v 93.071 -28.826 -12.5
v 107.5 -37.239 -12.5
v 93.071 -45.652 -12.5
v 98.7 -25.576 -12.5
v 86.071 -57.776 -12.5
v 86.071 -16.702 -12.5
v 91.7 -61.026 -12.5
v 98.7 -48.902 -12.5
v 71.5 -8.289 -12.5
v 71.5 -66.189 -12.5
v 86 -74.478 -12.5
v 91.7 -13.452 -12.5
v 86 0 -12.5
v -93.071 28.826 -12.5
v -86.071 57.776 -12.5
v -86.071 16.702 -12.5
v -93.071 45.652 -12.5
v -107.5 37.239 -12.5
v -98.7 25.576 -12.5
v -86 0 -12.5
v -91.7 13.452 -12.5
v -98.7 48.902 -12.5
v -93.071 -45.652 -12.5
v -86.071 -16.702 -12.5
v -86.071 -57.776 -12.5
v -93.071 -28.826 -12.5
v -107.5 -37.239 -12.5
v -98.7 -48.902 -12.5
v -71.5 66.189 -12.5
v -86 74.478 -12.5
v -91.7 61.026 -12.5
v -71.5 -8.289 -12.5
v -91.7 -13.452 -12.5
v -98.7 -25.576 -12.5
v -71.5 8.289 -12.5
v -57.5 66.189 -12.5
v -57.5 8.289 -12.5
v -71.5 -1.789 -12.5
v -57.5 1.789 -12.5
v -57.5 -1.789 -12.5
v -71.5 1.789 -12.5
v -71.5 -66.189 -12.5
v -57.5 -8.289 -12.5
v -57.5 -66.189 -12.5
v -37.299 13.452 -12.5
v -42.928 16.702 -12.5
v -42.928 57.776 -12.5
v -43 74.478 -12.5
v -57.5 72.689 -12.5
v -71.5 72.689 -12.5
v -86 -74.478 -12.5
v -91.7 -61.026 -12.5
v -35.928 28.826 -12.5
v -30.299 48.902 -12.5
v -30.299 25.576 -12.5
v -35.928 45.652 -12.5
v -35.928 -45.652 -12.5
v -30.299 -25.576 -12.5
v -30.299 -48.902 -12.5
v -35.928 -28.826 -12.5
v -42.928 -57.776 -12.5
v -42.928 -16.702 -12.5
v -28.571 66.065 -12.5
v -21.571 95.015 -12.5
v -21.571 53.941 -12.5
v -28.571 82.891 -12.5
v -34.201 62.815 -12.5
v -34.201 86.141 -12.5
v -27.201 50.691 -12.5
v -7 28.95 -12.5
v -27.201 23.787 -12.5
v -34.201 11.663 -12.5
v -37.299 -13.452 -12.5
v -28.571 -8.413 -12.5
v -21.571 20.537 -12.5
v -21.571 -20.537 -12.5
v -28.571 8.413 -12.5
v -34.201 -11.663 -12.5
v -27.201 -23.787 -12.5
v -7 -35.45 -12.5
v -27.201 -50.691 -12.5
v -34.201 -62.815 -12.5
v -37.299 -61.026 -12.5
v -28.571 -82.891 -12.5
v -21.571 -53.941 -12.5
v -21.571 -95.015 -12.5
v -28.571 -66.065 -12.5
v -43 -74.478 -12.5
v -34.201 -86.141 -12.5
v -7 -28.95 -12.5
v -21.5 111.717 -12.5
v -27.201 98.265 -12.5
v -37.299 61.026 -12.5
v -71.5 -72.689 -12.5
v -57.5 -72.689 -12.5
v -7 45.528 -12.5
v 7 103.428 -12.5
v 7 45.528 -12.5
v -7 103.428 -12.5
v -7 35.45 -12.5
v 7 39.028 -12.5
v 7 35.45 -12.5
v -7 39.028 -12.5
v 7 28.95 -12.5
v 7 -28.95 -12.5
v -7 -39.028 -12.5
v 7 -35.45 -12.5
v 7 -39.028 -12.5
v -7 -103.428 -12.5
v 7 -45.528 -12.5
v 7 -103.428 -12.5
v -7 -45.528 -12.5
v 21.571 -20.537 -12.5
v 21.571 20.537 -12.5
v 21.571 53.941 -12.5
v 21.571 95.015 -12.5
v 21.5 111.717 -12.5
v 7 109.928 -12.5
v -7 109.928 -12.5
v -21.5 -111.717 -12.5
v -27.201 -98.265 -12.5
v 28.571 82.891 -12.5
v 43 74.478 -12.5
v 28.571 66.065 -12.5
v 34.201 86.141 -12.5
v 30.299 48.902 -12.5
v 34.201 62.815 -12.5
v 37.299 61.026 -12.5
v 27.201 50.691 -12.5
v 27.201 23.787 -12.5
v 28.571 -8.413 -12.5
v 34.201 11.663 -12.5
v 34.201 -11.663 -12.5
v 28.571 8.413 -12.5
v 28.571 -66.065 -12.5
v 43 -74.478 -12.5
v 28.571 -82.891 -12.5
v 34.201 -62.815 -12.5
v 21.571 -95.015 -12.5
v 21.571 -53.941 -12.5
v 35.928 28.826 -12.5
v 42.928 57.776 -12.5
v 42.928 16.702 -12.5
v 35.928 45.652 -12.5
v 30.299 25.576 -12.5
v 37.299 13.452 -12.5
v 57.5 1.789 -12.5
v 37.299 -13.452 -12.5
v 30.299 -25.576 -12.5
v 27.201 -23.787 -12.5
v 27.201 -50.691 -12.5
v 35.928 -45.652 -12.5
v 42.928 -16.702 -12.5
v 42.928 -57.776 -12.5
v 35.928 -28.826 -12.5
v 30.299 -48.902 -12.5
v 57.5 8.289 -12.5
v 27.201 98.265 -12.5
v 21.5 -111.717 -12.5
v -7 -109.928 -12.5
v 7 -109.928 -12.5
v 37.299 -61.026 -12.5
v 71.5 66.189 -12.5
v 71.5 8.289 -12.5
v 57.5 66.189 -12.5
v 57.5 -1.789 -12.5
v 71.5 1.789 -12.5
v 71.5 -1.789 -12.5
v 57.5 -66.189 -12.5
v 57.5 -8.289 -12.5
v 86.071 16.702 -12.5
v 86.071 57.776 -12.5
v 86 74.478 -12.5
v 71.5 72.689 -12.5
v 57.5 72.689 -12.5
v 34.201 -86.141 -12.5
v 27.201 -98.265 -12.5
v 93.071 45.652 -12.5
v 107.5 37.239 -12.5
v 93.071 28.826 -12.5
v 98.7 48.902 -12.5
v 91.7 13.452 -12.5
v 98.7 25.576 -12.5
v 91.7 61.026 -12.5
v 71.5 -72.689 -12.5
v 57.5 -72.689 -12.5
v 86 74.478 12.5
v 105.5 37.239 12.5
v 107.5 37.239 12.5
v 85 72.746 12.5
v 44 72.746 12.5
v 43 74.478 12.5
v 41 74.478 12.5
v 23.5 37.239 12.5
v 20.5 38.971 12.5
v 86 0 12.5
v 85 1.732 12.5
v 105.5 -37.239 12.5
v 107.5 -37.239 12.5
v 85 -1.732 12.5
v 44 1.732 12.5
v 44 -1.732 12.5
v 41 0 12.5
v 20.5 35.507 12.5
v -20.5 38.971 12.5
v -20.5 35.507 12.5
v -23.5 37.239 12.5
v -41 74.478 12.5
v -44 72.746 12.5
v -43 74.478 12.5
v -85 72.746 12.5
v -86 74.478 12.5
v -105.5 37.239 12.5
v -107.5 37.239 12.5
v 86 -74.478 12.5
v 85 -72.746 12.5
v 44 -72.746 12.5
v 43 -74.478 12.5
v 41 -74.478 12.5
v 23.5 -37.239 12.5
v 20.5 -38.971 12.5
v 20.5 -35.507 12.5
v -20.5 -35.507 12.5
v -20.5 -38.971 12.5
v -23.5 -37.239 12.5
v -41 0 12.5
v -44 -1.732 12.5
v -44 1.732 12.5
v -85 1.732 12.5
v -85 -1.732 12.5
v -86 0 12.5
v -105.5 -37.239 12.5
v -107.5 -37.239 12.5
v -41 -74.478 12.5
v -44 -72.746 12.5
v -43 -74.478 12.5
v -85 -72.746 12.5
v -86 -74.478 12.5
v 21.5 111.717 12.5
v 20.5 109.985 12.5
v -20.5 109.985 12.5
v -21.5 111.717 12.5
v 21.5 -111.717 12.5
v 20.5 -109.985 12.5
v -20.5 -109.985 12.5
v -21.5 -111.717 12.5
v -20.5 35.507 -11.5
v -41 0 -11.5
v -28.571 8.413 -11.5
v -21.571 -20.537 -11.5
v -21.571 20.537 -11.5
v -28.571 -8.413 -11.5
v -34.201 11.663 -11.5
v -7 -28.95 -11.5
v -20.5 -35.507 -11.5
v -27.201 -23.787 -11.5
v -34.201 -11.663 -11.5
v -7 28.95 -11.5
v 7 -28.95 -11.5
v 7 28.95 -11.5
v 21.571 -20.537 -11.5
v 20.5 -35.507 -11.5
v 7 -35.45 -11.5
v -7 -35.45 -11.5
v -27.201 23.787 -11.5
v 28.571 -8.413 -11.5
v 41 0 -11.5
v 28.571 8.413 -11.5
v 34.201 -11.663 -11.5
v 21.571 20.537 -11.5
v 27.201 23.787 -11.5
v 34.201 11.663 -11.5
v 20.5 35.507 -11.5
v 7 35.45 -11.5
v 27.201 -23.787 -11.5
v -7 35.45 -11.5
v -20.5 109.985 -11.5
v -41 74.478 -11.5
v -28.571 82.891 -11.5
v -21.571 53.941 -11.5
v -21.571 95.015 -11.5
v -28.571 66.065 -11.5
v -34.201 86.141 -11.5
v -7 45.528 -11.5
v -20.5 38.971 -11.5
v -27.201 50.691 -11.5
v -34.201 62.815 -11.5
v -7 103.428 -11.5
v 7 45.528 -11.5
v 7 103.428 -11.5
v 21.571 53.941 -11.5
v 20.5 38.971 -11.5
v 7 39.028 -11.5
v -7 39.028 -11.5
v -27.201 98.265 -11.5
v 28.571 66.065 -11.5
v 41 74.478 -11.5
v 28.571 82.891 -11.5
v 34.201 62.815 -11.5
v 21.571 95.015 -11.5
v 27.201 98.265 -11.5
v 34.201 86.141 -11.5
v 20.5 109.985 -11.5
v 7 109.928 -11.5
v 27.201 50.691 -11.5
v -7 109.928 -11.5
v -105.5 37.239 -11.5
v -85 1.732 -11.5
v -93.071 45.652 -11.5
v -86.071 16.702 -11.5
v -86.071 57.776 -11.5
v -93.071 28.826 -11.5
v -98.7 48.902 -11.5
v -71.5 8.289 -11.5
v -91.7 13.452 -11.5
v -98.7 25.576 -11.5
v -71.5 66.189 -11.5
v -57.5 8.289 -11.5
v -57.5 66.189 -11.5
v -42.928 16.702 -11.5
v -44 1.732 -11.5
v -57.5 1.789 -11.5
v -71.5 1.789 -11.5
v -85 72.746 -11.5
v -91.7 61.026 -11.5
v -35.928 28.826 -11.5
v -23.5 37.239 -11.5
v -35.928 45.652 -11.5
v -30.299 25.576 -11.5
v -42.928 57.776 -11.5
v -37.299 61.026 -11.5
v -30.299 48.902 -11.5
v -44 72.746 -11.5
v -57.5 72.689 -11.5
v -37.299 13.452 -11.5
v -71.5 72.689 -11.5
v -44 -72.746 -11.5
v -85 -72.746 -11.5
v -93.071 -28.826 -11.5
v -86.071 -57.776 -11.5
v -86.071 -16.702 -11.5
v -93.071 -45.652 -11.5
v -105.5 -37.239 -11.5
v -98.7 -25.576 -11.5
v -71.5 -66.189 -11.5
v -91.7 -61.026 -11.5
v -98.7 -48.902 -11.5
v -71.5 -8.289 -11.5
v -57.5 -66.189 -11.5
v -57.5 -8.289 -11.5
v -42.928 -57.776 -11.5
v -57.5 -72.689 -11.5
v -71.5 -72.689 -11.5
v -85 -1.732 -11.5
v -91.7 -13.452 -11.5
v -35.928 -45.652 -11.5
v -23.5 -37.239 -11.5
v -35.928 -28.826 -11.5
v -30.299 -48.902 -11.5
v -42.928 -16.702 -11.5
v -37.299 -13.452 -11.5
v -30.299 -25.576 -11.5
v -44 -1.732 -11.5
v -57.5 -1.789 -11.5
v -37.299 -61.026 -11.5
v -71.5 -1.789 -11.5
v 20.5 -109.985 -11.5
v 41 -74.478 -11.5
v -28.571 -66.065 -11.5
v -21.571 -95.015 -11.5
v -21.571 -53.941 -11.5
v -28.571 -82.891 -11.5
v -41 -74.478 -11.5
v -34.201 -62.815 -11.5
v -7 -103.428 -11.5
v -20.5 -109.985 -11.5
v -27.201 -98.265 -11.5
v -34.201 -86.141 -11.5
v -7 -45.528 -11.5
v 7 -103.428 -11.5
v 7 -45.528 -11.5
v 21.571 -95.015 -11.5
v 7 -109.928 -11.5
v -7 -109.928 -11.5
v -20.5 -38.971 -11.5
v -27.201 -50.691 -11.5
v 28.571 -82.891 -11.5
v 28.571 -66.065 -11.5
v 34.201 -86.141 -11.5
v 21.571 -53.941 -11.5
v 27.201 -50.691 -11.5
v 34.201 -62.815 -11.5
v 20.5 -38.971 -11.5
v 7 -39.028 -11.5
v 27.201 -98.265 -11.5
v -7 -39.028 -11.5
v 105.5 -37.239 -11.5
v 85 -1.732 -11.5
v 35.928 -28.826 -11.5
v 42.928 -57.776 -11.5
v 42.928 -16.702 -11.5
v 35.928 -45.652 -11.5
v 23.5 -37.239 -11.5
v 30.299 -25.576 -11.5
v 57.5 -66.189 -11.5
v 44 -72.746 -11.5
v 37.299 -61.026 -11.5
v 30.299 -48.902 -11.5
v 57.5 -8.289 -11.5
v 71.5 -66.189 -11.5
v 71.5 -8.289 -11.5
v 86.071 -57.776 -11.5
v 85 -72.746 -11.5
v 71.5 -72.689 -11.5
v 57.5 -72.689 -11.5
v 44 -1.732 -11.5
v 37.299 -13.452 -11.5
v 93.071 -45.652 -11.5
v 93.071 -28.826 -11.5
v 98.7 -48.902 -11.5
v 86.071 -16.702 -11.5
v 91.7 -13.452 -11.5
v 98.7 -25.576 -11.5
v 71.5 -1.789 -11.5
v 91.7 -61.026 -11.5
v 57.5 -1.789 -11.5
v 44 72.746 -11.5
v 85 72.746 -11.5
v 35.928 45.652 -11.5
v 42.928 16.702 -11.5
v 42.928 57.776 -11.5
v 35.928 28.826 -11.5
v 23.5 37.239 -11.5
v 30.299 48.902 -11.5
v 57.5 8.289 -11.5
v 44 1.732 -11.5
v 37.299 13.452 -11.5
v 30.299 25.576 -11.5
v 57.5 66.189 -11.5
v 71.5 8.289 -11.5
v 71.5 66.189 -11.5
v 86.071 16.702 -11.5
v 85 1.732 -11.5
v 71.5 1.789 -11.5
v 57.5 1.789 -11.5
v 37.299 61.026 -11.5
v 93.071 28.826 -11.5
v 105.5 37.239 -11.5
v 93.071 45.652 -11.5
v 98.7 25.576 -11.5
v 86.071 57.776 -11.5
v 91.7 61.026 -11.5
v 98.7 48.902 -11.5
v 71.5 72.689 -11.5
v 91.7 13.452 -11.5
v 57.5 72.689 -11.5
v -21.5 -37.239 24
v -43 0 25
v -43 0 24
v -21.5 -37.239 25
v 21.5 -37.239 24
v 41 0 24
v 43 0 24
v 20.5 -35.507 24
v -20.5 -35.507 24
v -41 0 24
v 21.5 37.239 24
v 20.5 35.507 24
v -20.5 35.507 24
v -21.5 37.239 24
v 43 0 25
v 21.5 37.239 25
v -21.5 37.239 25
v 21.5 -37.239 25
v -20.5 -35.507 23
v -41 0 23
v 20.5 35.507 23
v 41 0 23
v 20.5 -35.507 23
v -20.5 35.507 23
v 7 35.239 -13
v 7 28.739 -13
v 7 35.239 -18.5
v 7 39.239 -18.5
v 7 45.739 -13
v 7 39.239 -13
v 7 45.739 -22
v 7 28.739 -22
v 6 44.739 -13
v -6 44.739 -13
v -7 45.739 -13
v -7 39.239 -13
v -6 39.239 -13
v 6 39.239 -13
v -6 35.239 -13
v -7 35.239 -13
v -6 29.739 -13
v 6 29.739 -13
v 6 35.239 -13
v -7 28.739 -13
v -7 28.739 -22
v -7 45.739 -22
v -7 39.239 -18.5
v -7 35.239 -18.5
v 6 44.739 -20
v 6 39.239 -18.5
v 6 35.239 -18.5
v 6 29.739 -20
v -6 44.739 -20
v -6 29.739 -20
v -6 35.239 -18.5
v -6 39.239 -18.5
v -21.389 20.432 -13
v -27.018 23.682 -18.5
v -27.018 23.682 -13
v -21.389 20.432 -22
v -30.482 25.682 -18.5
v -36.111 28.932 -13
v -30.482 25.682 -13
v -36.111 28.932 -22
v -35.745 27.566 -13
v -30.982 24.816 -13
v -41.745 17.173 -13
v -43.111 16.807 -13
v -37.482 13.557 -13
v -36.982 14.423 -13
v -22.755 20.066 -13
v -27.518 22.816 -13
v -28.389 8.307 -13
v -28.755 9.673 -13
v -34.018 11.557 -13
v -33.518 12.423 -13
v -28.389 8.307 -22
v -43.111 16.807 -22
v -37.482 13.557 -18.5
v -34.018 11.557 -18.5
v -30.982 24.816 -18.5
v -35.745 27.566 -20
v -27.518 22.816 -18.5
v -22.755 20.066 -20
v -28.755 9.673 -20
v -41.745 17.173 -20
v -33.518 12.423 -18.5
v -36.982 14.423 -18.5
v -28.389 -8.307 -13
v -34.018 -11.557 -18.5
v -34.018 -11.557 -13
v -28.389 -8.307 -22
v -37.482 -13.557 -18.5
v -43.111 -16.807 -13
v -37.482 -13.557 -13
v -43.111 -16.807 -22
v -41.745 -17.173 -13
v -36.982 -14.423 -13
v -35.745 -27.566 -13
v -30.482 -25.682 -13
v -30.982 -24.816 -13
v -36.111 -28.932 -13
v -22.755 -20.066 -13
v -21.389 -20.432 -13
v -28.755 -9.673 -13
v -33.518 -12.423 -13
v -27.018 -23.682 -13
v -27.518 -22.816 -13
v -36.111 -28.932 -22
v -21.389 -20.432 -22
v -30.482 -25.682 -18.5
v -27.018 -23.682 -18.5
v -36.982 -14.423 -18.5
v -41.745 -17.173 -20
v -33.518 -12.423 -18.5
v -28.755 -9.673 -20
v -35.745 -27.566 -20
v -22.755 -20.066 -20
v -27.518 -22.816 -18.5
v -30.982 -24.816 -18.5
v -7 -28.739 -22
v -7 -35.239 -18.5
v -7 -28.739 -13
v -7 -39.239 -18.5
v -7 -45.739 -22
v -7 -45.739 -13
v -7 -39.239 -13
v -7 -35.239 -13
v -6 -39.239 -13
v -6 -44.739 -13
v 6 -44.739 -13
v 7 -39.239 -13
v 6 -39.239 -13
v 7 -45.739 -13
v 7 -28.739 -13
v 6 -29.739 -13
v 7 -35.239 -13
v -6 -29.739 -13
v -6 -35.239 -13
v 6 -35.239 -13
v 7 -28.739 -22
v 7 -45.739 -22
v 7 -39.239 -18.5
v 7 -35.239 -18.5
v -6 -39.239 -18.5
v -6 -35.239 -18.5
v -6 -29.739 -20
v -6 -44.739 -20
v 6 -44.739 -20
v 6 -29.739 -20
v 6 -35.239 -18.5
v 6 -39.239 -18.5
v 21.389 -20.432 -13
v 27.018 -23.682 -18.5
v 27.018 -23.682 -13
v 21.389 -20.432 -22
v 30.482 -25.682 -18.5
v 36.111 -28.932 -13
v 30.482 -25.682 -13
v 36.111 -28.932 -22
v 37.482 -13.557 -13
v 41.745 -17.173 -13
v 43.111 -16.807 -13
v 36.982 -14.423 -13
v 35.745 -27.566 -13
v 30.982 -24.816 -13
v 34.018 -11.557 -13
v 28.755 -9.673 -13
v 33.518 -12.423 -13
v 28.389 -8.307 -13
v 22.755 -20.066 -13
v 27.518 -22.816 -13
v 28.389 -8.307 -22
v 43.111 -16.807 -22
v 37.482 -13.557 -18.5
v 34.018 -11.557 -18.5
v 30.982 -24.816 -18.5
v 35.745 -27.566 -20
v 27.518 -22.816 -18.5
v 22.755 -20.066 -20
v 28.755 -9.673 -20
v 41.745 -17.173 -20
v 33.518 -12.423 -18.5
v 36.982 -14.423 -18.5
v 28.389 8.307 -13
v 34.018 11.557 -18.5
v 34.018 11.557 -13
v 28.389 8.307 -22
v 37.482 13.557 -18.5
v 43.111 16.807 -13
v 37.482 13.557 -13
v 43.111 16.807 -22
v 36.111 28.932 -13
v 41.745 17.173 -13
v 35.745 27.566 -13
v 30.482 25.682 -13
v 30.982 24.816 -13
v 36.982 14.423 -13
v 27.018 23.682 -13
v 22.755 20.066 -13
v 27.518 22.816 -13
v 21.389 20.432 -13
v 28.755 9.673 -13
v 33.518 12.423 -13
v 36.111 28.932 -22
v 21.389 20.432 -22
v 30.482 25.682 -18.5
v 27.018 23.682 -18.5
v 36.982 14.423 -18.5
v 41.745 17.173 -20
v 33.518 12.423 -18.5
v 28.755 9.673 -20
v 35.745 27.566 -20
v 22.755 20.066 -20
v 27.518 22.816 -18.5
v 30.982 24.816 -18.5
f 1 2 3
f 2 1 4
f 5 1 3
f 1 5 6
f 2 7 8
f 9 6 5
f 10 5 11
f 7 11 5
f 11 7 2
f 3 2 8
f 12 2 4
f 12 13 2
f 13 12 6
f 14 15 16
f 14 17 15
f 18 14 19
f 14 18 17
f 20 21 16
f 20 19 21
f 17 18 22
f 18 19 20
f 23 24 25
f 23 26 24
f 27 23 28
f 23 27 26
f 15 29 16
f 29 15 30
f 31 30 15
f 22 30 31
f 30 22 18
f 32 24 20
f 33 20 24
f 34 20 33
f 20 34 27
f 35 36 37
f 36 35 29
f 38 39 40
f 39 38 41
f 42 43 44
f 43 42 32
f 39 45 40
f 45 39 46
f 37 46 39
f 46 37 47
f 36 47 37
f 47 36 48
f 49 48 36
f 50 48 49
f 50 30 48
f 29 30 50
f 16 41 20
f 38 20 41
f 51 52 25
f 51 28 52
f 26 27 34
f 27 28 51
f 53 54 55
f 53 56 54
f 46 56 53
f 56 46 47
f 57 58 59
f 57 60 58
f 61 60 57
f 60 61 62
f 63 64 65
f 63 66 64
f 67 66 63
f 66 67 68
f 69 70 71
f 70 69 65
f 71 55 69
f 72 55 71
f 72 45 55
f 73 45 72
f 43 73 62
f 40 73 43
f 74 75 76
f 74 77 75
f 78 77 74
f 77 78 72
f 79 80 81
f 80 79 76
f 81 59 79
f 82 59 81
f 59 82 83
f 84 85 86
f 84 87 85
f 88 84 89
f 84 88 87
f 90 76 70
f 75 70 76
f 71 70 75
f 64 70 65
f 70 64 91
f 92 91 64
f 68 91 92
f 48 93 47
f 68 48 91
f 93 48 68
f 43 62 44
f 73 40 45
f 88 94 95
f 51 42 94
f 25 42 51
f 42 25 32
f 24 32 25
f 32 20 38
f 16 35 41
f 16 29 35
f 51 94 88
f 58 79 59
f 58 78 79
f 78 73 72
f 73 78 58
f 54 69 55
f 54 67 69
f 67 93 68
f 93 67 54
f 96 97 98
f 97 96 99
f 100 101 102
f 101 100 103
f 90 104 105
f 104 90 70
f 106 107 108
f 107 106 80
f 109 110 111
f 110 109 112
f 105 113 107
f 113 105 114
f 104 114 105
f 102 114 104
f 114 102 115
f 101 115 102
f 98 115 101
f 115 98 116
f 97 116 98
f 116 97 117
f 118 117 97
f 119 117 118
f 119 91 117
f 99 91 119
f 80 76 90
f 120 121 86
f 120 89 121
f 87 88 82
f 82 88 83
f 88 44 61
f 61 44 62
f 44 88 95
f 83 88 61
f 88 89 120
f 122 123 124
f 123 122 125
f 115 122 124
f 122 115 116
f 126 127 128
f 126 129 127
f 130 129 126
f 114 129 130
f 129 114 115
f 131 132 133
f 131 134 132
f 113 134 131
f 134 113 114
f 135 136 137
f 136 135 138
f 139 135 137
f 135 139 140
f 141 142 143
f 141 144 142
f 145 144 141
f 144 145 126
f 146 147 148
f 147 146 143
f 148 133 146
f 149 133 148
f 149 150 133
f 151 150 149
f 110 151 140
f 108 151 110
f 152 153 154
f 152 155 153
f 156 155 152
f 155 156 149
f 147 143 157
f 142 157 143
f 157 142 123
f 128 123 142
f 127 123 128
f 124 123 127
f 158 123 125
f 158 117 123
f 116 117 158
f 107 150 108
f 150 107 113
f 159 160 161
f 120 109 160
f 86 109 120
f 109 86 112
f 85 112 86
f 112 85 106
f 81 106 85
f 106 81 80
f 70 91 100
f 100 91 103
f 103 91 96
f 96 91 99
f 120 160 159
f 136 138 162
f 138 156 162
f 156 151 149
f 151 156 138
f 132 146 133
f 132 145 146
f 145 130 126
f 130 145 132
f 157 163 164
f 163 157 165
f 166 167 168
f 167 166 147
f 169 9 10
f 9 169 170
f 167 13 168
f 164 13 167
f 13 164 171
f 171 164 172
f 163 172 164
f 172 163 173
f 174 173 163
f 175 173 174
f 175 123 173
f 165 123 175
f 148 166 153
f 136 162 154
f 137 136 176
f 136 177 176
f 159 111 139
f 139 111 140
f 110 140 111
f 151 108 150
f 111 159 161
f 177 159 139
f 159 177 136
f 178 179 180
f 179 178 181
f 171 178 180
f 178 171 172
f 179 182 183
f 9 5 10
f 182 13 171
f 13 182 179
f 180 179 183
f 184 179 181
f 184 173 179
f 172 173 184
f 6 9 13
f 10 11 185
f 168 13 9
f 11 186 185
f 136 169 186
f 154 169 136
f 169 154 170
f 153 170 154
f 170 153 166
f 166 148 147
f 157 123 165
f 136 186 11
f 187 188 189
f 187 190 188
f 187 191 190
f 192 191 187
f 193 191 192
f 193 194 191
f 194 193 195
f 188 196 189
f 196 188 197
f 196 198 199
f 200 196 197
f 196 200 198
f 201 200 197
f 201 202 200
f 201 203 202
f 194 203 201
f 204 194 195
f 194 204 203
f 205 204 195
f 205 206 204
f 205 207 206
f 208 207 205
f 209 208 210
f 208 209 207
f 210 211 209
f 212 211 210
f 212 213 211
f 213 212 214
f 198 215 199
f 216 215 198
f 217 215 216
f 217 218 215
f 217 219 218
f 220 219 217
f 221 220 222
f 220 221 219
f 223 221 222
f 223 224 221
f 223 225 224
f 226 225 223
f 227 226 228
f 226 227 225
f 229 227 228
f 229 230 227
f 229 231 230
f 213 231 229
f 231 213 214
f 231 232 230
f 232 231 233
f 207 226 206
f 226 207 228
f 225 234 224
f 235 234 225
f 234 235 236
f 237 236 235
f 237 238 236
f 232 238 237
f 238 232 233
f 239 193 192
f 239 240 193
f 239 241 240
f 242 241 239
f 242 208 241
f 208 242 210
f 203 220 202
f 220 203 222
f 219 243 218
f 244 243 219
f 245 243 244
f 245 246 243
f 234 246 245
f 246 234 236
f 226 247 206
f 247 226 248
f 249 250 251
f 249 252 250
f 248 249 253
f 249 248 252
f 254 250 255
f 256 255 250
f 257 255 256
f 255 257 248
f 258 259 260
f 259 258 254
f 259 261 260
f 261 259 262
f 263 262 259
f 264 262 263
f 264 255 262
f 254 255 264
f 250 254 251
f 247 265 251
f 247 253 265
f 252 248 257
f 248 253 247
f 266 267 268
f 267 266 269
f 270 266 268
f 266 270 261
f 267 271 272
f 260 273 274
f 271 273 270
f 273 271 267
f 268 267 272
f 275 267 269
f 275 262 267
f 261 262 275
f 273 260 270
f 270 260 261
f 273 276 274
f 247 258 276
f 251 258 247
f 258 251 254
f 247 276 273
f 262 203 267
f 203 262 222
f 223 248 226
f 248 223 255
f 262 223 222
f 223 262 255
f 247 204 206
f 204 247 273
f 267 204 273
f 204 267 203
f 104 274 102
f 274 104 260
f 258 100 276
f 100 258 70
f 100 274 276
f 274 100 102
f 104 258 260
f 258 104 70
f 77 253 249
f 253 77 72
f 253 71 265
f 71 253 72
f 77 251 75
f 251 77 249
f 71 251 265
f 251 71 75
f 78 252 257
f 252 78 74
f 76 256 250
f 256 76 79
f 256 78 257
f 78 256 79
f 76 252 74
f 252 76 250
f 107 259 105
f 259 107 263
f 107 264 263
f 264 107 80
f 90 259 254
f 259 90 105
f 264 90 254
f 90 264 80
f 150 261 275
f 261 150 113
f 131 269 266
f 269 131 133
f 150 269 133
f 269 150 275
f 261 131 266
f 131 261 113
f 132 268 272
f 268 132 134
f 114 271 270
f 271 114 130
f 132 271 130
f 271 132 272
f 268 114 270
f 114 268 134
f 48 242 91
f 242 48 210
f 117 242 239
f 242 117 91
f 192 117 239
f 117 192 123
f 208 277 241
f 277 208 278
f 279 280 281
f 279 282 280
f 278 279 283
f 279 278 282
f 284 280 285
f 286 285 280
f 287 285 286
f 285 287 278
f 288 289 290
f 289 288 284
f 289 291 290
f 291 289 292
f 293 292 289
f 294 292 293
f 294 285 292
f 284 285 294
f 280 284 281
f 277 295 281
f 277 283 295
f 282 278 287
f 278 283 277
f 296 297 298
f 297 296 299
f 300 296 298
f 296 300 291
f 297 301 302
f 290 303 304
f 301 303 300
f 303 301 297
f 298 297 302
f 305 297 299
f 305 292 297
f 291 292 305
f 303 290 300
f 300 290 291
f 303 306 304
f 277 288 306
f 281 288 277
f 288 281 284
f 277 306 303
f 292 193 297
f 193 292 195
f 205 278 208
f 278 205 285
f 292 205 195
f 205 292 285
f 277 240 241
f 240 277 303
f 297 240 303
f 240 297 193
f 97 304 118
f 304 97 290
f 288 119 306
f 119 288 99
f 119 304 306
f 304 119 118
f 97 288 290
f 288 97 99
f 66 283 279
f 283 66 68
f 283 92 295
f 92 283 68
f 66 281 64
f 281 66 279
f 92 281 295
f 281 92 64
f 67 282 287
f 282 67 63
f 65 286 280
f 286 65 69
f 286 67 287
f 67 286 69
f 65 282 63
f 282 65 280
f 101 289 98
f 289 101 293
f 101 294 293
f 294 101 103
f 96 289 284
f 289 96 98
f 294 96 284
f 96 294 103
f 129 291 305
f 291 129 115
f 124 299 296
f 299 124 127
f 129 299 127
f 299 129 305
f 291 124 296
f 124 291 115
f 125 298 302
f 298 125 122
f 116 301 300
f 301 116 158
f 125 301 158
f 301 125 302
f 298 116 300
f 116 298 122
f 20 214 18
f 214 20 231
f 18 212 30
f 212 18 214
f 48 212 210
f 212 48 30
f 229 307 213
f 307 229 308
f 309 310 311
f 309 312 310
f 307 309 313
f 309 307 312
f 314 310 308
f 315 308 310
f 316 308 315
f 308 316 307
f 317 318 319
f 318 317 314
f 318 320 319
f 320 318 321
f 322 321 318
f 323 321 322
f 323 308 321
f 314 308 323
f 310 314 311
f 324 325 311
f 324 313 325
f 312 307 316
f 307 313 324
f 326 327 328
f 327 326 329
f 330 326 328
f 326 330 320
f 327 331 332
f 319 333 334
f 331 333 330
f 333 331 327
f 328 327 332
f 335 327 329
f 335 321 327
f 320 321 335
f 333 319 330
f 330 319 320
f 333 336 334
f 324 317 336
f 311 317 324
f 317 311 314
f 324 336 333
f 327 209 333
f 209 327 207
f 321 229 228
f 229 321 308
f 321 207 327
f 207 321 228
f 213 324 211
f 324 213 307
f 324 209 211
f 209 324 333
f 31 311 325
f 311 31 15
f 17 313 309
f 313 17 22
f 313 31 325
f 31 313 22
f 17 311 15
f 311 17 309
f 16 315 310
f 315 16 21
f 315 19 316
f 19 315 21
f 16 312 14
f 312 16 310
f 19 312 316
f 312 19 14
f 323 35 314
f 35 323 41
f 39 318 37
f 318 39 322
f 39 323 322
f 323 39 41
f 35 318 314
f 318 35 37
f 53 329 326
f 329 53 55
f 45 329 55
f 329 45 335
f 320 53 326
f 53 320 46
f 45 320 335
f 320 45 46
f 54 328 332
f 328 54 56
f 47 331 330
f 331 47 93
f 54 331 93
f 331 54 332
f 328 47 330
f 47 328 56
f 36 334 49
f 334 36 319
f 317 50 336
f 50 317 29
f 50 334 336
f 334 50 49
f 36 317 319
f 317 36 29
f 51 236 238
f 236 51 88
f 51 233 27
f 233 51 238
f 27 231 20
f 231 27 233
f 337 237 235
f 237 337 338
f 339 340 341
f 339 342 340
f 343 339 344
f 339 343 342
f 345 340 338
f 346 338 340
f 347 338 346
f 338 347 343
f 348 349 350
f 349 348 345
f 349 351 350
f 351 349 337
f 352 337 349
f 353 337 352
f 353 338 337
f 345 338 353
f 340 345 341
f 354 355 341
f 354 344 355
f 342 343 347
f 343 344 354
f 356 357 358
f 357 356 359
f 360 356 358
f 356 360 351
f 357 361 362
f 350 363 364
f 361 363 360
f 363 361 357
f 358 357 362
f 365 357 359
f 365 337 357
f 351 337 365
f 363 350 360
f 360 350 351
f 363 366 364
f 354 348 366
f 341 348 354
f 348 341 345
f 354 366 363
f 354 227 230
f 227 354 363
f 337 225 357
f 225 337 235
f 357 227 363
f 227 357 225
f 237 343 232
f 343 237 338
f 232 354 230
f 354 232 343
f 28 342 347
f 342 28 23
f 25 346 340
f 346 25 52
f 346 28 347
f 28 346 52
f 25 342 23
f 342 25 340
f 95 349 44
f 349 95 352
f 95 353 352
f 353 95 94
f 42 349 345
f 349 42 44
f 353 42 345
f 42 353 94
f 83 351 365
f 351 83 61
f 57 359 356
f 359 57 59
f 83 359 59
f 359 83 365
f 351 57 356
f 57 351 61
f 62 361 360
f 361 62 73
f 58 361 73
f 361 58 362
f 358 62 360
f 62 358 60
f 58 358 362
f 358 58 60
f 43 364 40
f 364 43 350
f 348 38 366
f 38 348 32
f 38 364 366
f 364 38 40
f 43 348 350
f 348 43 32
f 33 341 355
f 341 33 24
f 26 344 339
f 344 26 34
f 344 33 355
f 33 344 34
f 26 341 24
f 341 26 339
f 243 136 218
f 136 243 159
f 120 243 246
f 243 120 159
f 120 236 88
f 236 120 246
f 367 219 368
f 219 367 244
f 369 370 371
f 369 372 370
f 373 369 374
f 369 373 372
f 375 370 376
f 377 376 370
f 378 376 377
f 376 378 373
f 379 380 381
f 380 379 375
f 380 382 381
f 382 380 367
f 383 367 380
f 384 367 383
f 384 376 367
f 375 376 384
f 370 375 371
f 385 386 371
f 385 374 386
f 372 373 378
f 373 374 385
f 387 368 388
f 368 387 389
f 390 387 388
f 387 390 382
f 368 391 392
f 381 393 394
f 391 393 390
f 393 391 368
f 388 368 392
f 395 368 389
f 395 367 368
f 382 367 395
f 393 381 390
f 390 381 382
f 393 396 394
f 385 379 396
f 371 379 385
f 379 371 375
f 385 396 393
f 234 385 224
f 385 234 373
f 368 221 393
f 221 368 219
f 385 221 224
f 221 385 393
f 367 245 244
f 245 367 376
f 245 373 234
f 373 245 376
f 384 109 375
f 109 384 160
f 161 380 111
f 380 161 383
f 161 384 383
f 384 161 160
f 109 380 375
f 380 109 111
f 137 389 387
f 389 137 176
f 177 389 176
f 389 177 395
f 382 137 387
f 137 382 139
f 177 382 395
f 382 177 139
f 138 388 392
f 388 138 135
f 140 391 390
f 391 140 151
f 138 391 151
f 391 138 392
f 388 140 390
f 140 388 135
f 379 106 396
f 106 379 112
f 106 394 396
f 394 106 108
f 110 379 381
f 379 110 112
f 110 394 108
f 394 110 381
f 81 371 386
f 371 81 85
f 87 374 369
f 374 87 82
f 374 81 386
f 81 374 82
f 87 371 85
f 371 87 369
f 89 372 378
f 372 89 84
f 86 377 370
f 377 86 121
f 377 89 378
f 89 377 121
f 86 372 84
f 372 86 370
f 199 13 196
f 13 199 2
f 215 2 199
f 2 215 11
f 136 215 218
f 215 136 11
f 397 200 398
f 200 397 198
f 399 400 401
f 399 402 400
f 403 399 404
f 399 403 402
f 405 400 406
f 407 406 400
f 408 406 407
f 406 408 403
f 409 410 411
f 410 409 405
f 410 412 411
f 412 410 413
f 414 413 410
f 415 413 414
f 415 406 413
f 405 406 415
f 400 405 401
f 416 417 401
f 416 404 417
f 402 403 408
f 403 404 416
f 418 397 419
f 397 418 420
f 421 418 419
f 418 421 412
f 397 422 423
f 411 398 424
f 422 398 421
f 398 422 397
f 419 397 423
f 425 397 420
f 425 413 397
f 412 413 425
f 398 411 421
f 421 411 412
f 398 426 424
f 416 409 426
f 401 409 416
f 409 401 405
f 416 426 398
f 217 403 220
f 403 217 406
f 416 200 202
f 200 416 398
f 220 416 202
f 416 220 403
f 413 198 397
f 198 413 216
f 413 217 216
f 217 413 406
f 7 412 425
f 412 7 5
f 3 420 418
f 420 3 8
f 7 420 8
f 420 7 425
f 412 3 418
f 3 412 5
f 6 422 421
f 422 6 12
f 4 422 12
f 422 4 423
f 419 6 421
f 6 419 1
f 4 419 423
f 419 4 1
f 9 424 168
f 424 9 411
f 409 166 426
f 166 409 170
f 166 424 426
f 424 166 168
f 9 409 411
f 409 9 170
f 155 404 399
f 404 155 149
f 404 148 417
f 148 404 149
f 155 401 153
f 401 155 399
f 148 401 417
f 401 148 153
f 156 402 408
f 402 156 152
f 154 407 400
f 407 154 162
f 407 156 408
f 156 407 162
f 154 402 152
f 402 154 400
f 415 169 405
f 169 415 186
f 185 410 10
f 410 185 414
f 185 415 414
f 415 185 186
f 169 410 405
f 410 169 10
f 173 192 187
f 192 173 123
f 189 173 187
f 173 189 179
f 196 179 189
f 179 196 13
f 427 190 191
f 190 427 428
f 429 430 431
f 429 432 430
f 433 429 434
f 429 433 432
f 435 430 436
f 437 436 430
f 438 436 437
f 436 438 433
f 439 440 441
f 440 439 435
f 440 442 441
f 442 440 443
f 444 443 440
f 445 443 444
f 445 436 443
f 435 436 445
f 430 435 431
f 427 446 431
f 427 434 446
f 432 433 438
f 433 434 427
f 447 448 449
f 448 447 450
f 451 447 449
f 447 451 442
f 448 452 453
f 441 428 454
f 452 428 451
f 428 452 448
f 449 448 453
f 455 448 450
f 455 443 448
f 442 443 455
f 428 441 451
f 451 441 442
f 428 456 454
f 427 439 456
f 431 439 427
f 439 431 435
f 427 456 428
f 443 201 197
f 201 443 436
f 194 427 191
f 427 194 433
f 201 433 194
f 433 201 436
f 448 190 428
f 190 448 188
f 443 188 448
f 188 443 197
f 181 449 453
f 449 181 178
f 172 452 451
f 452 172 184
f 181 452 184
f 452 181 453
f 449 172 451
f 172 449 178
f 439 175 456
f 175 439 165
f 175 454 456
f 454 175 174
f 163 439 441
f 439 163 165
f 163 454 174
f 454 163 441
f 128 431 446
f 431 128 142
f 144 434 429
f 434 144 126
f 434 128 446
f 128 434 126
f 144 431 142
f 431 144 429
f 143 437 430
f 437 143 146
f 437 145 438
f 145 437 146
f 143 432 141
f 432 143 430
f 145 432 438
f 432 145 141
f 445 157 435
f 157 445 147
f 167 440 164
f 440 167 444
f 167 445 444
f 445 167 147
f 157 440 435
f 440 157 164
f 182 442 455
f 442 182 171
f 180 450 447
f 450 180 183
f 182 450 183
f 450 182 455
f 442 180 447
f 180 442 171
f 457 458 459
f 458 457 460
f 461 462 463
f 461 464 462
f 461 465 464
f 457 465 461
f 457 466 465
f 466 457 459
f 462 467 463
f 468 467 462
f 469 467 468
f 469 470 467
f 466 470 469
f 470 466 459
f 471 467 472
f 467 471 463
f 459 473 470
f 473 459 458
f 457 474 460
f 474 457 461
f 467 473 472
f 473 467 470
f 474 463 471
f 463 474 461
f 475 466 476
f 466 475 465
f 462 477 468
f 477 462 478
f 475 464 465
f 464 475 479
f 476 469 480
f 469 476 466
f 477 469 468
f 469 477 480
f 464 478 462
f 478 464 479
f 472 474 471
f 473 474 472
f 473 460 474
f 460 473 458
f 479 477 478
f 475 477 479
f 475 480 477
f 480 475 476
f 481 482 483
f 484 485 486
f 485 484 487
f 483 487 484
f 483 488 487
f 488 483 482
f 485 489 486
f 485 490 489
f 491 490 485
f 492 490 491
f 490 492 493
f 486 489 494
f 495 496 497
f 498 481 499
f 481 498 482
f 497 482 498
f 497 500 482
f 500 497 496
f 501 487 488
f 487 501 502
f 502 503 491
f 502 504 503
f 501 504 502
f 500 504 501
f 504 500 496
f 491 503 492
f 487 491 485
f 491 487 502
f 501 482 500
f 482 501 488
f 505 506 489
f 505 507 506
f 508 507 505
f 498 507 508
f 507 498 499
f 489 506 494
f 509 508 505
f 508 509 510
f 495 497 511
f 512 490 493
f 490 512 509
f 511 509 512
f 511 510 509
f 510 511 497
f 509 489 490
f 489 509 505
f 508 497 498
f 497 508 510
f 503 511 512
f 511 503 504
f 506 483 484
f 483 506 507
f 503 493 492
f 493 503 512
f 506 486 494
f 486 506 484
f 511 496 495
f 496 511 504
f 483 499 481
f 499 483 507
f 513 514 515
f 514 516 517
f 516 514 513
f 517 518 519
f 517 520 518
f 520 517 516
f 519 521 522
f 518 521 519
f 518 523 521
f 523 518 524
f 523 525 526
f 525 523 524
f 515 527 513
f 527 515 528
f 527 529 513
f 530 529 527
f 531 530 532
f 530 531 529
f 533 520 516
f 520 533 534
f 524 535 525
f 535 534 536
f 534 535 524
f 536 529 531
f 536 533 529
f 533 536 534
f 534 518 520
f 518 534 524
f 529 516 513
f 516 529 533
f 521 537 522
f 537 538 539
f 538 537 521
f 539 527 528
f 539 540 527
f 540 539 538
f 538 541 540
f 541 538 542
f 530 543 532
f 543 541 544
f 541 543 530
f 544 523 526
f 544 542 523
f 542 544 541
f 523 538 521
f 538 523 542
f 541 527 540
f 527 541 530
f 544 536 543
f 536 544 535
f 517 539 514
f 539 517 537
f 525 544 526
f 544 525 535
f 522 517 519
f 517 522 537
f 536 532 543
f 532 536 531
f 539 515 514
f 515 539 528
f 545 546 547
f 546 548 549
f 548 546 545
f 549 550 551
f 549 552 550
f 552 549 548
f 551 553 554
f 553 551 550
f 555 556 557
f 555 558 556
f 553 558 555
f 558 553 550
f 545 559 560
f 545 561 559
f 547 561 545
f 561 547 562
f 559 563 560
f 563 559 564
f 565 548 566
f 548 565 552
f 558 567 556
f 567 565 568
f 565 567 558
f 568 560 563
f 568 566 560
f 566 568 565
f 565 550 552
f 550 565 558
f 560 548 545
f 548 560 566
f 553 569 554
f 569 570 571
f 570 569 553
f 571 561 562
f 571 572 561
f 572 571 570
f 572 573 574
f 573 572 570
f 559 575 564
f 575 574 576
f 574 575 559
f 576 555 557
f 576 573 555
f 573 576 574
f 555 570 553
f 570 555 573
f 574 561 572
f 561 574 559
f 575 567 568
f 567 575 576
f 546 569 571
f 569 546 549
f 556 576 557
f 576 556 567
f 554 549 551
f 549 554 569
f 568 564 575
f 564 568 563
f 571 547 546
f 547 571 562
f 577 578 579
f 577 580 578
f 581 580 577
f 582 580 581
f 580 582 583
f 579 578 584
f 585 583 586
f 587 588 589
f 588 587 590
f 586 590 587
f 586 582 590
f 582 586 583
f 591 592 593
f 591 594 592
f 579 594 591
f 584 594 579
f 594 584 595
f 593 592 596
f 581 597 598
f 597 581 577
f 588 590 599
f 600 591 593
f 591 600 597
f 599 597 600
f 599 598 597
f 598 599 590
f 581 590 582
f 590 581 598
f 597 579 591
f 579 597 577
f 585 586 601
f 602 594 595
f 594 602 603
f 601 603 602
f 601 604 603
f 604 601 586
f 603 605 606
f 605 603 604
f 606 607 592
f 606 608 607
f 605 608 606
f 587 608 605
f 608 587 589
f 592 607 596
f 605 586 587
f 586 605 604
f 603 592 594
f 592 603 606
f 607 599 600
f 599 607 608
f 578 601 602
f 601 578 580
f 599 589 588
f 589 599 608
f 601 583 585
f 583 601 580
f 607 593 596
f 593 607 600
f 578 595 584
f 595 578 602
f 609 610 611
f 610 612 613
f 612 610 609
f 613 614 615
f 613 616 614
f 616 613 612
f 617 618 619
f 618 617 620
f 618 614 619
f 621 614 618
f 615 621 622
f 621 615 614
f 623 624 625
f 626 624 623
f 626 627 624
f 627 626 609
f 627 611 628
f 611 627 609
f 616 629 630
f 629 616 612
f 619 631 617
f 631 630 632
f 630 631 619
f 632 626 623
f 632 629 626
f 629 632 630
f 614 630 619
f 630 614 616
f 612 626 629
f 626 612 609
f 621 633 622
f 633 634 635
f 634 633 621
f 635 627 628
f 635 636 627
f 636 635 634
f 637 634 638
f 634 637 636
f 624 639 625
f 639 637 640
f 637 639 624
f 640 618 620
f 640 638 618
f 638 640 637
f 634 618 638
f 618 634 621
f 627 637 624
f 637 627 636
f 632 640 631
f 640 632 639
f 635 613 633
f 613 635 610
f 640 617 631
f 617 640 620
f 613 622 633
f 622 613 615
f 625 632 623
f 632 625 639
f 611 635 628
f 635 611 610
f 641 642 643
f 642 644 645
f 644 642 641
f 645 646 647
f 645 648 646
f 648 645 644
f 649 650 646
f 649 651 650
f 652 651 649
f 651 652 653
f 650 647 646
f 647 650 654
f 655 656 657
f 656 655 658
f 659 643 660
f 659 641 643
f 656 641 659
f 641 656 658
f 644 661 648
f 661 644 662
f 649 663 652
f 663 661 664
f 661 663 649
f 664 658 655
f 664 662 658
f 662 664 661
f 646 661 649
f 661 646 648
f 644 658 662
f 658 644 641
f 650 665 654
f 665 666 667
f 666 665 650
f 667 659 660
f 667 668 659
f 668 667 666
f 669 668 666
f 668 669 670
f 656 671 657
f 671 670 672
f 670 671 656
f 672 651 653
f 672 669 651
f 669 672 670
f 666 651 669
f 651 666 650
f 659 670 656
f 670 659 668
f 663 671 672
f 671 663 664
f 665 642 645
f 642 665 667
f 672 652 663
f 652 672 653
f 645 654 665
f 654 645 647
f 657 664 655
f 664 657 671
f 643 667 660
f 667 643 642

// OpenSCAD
/* 
Cololight like hexagon lights
*/

// include <cololight_tribute_header.scad>

/* 
variable definitions
*/

hex_height=25;
hex_lon_d=86;
hex_short_d=74.478;
hex_incir_rad=43;
hex_lip_depth=1;
diffuser_thickness=2;
diffuser_lip_width=0;
diffuser_edge_thickness=1;
diffuser_clip_thickness=4;
diffuser_clip_wall_thickness=1;
base_thickness=1;
edge_thickness=2;
pin_header_width=8;
pin_header_height=2.5;
clip_mouth_width=14;
clip_mouth_length=6.5;
clip_edge_offset=4.3;
clip_height_constant=8;
//clip_width=22;
clip_length=(2*clip_mouth_length)+(2*edge_thickness);
clip_height=clip_height_constant+base_thickness;


 /*
hexagonal light housing
*/

module hex_light_module(module_height=hex_height, module_radius=hex_incir_rad, module_color="yellow", module_edge_thickness=edge_thickness, module_base_thickness=base_thickness, module_diffuser_thickness=diffuser_thickness, module_diffuser_lip_width=diffuser_lip_width, module_clip_mouth_width=clip_mouth_width, module_clip_mouth_length=clip_mouth_length, module_clip_edge_offset=clip_edge_offset, module_short_d=hex_short_d) {
    
    color(module_color)
   
    difference() {
        
        difference() {
        
            difference() {
                linear_extrude(height = module_height, center = true, convexity = 10, twist = 0){
                circle(r=module_radius, $fn=6);
                }
                translate([0,0,module_base_thickness]){
                    linear_extrude(height = module_height, center = true, convexity = 10, twist = 0){
                        circle(r=module_radius-module_edge_thickness, $fn=6);
                    }
                }
            }
            
            translate([0,0,(module_height/2)]){
                linear_extrude(height = module_diffuser_thickness-(module_edge_thickness-module_diffuser_lip_width), center = true, convexity = 10, twist = 0){
                    circle(r=module_radius-1, $fn=6);
                }
            }
        }
         
       
        for(a=[0:1:5]){
            rotate([0,0,a*60]) translate([0,module_radius-module_clip_mouth_length-module_clip_edge_offset
        ,0]) {
                cube( size=[module_clip_mouth_width, module_clip_mouth_length, module_height*2], center=true);
            }    
        }    
       

        
    }
}

/*
diffuser definition
*/

module diffuser_module(module_height=hex_height, module_radius=hex_incir_rad, diffuser_color="white", module_edge_thickness=edge_thickness, module_base_thickness=base_thickness, module_diffuser_thickness=diffuser_thickness, module_diffuser_lip_width=diffuser_lip_width, module_clip_mouth_width=clip_mouth_width, module_clip_mouth_length=clip_mouth_length, module_clip_edge_offset=clip_edge_offset) {
    
    color(diffuser_color)
    group() {
        difference() {
        
            color("green")
            linear_extrude(height = diffuser_thickness, center = false, convexity = 10, twist = 0){
                circle(r=hex_incir_rad, $fn=6);
            }
        
        /* 
        diffuser cutting tool definition
        */
            
        translate([0,0,diffuser_edge_thickness]){
            group(){
              
                difference(){
                    color("blue")
                    linear_extrude(height = diffuser_thickness*2, center = false, convexity = 10, twist = 0){
                        circle(r=hex_incir_rad, $fn=6);
                    }
                    color("red")
                    linear_extrude(height = diffuser_thickness*2, center = false, convexity = 10, twist = 0){
                        circle(r=hex_incir_rad-(edge_thickness-diffuser_lip_width), $fn=6);
                    }
                }
            }
        }   
          
        
        }
    }
}

/*
cololight tribute hexagonal light clip
*/

module clip_module(module_height=hex_height, module_radius=hex_incir_rad, clip_color="white", module_edge_thickness=edge_thickness, module_base_thickness=base_thickness, module_diffuser_thickness=diffuser_thickness, module_diffuser_lip_width=diffuser_lip_width, module_clip_mouth_width=clip_mouth_width, module_clip_mouth_length=clip_mouth_length, module_clip_edge_offset=clip_edge_offset) {
    
    color(clip_color)
    group() {
        difference(){
            difference(){
                cube( size=[clip_mouth_width,clip_length,clip_height], center=true);
    
                translate([0,0,edge_thickness]){
                    cube( size=[clip_mouth_width-module_edge_thickness,clip_length-module_edge_thickness,clip_height], center=true);
                }
            }
            
            translate([0,0,base_thickness+pin_header_height]){
                cube( size=[clip_mouth_width+2,edge_thickness*2,clip_height], center=true);
                }
                }
                
    }
}

hex_light_module(module_color="green");
for(a=[0:1:5]){
    rotate([0,0,a*60]) translate([0,hex_short_d,0]) {
        hex_light_module(module_color=[1,0,0,.5]);
    }
}
translate([0,0,25])
rotate([180,0,0])
diffuser_module(diffuser_color=[0,0,1,.5]);
translate([0,0,-((hex_height/2)+5)])
for(a=[0:1:5]){
            rotate([0,0,a*60]) translate([0,hex_short_d/2,0]) {
    clip_module(clip_color=[0.1,0.1,0.1,.5]);
        }
    }
